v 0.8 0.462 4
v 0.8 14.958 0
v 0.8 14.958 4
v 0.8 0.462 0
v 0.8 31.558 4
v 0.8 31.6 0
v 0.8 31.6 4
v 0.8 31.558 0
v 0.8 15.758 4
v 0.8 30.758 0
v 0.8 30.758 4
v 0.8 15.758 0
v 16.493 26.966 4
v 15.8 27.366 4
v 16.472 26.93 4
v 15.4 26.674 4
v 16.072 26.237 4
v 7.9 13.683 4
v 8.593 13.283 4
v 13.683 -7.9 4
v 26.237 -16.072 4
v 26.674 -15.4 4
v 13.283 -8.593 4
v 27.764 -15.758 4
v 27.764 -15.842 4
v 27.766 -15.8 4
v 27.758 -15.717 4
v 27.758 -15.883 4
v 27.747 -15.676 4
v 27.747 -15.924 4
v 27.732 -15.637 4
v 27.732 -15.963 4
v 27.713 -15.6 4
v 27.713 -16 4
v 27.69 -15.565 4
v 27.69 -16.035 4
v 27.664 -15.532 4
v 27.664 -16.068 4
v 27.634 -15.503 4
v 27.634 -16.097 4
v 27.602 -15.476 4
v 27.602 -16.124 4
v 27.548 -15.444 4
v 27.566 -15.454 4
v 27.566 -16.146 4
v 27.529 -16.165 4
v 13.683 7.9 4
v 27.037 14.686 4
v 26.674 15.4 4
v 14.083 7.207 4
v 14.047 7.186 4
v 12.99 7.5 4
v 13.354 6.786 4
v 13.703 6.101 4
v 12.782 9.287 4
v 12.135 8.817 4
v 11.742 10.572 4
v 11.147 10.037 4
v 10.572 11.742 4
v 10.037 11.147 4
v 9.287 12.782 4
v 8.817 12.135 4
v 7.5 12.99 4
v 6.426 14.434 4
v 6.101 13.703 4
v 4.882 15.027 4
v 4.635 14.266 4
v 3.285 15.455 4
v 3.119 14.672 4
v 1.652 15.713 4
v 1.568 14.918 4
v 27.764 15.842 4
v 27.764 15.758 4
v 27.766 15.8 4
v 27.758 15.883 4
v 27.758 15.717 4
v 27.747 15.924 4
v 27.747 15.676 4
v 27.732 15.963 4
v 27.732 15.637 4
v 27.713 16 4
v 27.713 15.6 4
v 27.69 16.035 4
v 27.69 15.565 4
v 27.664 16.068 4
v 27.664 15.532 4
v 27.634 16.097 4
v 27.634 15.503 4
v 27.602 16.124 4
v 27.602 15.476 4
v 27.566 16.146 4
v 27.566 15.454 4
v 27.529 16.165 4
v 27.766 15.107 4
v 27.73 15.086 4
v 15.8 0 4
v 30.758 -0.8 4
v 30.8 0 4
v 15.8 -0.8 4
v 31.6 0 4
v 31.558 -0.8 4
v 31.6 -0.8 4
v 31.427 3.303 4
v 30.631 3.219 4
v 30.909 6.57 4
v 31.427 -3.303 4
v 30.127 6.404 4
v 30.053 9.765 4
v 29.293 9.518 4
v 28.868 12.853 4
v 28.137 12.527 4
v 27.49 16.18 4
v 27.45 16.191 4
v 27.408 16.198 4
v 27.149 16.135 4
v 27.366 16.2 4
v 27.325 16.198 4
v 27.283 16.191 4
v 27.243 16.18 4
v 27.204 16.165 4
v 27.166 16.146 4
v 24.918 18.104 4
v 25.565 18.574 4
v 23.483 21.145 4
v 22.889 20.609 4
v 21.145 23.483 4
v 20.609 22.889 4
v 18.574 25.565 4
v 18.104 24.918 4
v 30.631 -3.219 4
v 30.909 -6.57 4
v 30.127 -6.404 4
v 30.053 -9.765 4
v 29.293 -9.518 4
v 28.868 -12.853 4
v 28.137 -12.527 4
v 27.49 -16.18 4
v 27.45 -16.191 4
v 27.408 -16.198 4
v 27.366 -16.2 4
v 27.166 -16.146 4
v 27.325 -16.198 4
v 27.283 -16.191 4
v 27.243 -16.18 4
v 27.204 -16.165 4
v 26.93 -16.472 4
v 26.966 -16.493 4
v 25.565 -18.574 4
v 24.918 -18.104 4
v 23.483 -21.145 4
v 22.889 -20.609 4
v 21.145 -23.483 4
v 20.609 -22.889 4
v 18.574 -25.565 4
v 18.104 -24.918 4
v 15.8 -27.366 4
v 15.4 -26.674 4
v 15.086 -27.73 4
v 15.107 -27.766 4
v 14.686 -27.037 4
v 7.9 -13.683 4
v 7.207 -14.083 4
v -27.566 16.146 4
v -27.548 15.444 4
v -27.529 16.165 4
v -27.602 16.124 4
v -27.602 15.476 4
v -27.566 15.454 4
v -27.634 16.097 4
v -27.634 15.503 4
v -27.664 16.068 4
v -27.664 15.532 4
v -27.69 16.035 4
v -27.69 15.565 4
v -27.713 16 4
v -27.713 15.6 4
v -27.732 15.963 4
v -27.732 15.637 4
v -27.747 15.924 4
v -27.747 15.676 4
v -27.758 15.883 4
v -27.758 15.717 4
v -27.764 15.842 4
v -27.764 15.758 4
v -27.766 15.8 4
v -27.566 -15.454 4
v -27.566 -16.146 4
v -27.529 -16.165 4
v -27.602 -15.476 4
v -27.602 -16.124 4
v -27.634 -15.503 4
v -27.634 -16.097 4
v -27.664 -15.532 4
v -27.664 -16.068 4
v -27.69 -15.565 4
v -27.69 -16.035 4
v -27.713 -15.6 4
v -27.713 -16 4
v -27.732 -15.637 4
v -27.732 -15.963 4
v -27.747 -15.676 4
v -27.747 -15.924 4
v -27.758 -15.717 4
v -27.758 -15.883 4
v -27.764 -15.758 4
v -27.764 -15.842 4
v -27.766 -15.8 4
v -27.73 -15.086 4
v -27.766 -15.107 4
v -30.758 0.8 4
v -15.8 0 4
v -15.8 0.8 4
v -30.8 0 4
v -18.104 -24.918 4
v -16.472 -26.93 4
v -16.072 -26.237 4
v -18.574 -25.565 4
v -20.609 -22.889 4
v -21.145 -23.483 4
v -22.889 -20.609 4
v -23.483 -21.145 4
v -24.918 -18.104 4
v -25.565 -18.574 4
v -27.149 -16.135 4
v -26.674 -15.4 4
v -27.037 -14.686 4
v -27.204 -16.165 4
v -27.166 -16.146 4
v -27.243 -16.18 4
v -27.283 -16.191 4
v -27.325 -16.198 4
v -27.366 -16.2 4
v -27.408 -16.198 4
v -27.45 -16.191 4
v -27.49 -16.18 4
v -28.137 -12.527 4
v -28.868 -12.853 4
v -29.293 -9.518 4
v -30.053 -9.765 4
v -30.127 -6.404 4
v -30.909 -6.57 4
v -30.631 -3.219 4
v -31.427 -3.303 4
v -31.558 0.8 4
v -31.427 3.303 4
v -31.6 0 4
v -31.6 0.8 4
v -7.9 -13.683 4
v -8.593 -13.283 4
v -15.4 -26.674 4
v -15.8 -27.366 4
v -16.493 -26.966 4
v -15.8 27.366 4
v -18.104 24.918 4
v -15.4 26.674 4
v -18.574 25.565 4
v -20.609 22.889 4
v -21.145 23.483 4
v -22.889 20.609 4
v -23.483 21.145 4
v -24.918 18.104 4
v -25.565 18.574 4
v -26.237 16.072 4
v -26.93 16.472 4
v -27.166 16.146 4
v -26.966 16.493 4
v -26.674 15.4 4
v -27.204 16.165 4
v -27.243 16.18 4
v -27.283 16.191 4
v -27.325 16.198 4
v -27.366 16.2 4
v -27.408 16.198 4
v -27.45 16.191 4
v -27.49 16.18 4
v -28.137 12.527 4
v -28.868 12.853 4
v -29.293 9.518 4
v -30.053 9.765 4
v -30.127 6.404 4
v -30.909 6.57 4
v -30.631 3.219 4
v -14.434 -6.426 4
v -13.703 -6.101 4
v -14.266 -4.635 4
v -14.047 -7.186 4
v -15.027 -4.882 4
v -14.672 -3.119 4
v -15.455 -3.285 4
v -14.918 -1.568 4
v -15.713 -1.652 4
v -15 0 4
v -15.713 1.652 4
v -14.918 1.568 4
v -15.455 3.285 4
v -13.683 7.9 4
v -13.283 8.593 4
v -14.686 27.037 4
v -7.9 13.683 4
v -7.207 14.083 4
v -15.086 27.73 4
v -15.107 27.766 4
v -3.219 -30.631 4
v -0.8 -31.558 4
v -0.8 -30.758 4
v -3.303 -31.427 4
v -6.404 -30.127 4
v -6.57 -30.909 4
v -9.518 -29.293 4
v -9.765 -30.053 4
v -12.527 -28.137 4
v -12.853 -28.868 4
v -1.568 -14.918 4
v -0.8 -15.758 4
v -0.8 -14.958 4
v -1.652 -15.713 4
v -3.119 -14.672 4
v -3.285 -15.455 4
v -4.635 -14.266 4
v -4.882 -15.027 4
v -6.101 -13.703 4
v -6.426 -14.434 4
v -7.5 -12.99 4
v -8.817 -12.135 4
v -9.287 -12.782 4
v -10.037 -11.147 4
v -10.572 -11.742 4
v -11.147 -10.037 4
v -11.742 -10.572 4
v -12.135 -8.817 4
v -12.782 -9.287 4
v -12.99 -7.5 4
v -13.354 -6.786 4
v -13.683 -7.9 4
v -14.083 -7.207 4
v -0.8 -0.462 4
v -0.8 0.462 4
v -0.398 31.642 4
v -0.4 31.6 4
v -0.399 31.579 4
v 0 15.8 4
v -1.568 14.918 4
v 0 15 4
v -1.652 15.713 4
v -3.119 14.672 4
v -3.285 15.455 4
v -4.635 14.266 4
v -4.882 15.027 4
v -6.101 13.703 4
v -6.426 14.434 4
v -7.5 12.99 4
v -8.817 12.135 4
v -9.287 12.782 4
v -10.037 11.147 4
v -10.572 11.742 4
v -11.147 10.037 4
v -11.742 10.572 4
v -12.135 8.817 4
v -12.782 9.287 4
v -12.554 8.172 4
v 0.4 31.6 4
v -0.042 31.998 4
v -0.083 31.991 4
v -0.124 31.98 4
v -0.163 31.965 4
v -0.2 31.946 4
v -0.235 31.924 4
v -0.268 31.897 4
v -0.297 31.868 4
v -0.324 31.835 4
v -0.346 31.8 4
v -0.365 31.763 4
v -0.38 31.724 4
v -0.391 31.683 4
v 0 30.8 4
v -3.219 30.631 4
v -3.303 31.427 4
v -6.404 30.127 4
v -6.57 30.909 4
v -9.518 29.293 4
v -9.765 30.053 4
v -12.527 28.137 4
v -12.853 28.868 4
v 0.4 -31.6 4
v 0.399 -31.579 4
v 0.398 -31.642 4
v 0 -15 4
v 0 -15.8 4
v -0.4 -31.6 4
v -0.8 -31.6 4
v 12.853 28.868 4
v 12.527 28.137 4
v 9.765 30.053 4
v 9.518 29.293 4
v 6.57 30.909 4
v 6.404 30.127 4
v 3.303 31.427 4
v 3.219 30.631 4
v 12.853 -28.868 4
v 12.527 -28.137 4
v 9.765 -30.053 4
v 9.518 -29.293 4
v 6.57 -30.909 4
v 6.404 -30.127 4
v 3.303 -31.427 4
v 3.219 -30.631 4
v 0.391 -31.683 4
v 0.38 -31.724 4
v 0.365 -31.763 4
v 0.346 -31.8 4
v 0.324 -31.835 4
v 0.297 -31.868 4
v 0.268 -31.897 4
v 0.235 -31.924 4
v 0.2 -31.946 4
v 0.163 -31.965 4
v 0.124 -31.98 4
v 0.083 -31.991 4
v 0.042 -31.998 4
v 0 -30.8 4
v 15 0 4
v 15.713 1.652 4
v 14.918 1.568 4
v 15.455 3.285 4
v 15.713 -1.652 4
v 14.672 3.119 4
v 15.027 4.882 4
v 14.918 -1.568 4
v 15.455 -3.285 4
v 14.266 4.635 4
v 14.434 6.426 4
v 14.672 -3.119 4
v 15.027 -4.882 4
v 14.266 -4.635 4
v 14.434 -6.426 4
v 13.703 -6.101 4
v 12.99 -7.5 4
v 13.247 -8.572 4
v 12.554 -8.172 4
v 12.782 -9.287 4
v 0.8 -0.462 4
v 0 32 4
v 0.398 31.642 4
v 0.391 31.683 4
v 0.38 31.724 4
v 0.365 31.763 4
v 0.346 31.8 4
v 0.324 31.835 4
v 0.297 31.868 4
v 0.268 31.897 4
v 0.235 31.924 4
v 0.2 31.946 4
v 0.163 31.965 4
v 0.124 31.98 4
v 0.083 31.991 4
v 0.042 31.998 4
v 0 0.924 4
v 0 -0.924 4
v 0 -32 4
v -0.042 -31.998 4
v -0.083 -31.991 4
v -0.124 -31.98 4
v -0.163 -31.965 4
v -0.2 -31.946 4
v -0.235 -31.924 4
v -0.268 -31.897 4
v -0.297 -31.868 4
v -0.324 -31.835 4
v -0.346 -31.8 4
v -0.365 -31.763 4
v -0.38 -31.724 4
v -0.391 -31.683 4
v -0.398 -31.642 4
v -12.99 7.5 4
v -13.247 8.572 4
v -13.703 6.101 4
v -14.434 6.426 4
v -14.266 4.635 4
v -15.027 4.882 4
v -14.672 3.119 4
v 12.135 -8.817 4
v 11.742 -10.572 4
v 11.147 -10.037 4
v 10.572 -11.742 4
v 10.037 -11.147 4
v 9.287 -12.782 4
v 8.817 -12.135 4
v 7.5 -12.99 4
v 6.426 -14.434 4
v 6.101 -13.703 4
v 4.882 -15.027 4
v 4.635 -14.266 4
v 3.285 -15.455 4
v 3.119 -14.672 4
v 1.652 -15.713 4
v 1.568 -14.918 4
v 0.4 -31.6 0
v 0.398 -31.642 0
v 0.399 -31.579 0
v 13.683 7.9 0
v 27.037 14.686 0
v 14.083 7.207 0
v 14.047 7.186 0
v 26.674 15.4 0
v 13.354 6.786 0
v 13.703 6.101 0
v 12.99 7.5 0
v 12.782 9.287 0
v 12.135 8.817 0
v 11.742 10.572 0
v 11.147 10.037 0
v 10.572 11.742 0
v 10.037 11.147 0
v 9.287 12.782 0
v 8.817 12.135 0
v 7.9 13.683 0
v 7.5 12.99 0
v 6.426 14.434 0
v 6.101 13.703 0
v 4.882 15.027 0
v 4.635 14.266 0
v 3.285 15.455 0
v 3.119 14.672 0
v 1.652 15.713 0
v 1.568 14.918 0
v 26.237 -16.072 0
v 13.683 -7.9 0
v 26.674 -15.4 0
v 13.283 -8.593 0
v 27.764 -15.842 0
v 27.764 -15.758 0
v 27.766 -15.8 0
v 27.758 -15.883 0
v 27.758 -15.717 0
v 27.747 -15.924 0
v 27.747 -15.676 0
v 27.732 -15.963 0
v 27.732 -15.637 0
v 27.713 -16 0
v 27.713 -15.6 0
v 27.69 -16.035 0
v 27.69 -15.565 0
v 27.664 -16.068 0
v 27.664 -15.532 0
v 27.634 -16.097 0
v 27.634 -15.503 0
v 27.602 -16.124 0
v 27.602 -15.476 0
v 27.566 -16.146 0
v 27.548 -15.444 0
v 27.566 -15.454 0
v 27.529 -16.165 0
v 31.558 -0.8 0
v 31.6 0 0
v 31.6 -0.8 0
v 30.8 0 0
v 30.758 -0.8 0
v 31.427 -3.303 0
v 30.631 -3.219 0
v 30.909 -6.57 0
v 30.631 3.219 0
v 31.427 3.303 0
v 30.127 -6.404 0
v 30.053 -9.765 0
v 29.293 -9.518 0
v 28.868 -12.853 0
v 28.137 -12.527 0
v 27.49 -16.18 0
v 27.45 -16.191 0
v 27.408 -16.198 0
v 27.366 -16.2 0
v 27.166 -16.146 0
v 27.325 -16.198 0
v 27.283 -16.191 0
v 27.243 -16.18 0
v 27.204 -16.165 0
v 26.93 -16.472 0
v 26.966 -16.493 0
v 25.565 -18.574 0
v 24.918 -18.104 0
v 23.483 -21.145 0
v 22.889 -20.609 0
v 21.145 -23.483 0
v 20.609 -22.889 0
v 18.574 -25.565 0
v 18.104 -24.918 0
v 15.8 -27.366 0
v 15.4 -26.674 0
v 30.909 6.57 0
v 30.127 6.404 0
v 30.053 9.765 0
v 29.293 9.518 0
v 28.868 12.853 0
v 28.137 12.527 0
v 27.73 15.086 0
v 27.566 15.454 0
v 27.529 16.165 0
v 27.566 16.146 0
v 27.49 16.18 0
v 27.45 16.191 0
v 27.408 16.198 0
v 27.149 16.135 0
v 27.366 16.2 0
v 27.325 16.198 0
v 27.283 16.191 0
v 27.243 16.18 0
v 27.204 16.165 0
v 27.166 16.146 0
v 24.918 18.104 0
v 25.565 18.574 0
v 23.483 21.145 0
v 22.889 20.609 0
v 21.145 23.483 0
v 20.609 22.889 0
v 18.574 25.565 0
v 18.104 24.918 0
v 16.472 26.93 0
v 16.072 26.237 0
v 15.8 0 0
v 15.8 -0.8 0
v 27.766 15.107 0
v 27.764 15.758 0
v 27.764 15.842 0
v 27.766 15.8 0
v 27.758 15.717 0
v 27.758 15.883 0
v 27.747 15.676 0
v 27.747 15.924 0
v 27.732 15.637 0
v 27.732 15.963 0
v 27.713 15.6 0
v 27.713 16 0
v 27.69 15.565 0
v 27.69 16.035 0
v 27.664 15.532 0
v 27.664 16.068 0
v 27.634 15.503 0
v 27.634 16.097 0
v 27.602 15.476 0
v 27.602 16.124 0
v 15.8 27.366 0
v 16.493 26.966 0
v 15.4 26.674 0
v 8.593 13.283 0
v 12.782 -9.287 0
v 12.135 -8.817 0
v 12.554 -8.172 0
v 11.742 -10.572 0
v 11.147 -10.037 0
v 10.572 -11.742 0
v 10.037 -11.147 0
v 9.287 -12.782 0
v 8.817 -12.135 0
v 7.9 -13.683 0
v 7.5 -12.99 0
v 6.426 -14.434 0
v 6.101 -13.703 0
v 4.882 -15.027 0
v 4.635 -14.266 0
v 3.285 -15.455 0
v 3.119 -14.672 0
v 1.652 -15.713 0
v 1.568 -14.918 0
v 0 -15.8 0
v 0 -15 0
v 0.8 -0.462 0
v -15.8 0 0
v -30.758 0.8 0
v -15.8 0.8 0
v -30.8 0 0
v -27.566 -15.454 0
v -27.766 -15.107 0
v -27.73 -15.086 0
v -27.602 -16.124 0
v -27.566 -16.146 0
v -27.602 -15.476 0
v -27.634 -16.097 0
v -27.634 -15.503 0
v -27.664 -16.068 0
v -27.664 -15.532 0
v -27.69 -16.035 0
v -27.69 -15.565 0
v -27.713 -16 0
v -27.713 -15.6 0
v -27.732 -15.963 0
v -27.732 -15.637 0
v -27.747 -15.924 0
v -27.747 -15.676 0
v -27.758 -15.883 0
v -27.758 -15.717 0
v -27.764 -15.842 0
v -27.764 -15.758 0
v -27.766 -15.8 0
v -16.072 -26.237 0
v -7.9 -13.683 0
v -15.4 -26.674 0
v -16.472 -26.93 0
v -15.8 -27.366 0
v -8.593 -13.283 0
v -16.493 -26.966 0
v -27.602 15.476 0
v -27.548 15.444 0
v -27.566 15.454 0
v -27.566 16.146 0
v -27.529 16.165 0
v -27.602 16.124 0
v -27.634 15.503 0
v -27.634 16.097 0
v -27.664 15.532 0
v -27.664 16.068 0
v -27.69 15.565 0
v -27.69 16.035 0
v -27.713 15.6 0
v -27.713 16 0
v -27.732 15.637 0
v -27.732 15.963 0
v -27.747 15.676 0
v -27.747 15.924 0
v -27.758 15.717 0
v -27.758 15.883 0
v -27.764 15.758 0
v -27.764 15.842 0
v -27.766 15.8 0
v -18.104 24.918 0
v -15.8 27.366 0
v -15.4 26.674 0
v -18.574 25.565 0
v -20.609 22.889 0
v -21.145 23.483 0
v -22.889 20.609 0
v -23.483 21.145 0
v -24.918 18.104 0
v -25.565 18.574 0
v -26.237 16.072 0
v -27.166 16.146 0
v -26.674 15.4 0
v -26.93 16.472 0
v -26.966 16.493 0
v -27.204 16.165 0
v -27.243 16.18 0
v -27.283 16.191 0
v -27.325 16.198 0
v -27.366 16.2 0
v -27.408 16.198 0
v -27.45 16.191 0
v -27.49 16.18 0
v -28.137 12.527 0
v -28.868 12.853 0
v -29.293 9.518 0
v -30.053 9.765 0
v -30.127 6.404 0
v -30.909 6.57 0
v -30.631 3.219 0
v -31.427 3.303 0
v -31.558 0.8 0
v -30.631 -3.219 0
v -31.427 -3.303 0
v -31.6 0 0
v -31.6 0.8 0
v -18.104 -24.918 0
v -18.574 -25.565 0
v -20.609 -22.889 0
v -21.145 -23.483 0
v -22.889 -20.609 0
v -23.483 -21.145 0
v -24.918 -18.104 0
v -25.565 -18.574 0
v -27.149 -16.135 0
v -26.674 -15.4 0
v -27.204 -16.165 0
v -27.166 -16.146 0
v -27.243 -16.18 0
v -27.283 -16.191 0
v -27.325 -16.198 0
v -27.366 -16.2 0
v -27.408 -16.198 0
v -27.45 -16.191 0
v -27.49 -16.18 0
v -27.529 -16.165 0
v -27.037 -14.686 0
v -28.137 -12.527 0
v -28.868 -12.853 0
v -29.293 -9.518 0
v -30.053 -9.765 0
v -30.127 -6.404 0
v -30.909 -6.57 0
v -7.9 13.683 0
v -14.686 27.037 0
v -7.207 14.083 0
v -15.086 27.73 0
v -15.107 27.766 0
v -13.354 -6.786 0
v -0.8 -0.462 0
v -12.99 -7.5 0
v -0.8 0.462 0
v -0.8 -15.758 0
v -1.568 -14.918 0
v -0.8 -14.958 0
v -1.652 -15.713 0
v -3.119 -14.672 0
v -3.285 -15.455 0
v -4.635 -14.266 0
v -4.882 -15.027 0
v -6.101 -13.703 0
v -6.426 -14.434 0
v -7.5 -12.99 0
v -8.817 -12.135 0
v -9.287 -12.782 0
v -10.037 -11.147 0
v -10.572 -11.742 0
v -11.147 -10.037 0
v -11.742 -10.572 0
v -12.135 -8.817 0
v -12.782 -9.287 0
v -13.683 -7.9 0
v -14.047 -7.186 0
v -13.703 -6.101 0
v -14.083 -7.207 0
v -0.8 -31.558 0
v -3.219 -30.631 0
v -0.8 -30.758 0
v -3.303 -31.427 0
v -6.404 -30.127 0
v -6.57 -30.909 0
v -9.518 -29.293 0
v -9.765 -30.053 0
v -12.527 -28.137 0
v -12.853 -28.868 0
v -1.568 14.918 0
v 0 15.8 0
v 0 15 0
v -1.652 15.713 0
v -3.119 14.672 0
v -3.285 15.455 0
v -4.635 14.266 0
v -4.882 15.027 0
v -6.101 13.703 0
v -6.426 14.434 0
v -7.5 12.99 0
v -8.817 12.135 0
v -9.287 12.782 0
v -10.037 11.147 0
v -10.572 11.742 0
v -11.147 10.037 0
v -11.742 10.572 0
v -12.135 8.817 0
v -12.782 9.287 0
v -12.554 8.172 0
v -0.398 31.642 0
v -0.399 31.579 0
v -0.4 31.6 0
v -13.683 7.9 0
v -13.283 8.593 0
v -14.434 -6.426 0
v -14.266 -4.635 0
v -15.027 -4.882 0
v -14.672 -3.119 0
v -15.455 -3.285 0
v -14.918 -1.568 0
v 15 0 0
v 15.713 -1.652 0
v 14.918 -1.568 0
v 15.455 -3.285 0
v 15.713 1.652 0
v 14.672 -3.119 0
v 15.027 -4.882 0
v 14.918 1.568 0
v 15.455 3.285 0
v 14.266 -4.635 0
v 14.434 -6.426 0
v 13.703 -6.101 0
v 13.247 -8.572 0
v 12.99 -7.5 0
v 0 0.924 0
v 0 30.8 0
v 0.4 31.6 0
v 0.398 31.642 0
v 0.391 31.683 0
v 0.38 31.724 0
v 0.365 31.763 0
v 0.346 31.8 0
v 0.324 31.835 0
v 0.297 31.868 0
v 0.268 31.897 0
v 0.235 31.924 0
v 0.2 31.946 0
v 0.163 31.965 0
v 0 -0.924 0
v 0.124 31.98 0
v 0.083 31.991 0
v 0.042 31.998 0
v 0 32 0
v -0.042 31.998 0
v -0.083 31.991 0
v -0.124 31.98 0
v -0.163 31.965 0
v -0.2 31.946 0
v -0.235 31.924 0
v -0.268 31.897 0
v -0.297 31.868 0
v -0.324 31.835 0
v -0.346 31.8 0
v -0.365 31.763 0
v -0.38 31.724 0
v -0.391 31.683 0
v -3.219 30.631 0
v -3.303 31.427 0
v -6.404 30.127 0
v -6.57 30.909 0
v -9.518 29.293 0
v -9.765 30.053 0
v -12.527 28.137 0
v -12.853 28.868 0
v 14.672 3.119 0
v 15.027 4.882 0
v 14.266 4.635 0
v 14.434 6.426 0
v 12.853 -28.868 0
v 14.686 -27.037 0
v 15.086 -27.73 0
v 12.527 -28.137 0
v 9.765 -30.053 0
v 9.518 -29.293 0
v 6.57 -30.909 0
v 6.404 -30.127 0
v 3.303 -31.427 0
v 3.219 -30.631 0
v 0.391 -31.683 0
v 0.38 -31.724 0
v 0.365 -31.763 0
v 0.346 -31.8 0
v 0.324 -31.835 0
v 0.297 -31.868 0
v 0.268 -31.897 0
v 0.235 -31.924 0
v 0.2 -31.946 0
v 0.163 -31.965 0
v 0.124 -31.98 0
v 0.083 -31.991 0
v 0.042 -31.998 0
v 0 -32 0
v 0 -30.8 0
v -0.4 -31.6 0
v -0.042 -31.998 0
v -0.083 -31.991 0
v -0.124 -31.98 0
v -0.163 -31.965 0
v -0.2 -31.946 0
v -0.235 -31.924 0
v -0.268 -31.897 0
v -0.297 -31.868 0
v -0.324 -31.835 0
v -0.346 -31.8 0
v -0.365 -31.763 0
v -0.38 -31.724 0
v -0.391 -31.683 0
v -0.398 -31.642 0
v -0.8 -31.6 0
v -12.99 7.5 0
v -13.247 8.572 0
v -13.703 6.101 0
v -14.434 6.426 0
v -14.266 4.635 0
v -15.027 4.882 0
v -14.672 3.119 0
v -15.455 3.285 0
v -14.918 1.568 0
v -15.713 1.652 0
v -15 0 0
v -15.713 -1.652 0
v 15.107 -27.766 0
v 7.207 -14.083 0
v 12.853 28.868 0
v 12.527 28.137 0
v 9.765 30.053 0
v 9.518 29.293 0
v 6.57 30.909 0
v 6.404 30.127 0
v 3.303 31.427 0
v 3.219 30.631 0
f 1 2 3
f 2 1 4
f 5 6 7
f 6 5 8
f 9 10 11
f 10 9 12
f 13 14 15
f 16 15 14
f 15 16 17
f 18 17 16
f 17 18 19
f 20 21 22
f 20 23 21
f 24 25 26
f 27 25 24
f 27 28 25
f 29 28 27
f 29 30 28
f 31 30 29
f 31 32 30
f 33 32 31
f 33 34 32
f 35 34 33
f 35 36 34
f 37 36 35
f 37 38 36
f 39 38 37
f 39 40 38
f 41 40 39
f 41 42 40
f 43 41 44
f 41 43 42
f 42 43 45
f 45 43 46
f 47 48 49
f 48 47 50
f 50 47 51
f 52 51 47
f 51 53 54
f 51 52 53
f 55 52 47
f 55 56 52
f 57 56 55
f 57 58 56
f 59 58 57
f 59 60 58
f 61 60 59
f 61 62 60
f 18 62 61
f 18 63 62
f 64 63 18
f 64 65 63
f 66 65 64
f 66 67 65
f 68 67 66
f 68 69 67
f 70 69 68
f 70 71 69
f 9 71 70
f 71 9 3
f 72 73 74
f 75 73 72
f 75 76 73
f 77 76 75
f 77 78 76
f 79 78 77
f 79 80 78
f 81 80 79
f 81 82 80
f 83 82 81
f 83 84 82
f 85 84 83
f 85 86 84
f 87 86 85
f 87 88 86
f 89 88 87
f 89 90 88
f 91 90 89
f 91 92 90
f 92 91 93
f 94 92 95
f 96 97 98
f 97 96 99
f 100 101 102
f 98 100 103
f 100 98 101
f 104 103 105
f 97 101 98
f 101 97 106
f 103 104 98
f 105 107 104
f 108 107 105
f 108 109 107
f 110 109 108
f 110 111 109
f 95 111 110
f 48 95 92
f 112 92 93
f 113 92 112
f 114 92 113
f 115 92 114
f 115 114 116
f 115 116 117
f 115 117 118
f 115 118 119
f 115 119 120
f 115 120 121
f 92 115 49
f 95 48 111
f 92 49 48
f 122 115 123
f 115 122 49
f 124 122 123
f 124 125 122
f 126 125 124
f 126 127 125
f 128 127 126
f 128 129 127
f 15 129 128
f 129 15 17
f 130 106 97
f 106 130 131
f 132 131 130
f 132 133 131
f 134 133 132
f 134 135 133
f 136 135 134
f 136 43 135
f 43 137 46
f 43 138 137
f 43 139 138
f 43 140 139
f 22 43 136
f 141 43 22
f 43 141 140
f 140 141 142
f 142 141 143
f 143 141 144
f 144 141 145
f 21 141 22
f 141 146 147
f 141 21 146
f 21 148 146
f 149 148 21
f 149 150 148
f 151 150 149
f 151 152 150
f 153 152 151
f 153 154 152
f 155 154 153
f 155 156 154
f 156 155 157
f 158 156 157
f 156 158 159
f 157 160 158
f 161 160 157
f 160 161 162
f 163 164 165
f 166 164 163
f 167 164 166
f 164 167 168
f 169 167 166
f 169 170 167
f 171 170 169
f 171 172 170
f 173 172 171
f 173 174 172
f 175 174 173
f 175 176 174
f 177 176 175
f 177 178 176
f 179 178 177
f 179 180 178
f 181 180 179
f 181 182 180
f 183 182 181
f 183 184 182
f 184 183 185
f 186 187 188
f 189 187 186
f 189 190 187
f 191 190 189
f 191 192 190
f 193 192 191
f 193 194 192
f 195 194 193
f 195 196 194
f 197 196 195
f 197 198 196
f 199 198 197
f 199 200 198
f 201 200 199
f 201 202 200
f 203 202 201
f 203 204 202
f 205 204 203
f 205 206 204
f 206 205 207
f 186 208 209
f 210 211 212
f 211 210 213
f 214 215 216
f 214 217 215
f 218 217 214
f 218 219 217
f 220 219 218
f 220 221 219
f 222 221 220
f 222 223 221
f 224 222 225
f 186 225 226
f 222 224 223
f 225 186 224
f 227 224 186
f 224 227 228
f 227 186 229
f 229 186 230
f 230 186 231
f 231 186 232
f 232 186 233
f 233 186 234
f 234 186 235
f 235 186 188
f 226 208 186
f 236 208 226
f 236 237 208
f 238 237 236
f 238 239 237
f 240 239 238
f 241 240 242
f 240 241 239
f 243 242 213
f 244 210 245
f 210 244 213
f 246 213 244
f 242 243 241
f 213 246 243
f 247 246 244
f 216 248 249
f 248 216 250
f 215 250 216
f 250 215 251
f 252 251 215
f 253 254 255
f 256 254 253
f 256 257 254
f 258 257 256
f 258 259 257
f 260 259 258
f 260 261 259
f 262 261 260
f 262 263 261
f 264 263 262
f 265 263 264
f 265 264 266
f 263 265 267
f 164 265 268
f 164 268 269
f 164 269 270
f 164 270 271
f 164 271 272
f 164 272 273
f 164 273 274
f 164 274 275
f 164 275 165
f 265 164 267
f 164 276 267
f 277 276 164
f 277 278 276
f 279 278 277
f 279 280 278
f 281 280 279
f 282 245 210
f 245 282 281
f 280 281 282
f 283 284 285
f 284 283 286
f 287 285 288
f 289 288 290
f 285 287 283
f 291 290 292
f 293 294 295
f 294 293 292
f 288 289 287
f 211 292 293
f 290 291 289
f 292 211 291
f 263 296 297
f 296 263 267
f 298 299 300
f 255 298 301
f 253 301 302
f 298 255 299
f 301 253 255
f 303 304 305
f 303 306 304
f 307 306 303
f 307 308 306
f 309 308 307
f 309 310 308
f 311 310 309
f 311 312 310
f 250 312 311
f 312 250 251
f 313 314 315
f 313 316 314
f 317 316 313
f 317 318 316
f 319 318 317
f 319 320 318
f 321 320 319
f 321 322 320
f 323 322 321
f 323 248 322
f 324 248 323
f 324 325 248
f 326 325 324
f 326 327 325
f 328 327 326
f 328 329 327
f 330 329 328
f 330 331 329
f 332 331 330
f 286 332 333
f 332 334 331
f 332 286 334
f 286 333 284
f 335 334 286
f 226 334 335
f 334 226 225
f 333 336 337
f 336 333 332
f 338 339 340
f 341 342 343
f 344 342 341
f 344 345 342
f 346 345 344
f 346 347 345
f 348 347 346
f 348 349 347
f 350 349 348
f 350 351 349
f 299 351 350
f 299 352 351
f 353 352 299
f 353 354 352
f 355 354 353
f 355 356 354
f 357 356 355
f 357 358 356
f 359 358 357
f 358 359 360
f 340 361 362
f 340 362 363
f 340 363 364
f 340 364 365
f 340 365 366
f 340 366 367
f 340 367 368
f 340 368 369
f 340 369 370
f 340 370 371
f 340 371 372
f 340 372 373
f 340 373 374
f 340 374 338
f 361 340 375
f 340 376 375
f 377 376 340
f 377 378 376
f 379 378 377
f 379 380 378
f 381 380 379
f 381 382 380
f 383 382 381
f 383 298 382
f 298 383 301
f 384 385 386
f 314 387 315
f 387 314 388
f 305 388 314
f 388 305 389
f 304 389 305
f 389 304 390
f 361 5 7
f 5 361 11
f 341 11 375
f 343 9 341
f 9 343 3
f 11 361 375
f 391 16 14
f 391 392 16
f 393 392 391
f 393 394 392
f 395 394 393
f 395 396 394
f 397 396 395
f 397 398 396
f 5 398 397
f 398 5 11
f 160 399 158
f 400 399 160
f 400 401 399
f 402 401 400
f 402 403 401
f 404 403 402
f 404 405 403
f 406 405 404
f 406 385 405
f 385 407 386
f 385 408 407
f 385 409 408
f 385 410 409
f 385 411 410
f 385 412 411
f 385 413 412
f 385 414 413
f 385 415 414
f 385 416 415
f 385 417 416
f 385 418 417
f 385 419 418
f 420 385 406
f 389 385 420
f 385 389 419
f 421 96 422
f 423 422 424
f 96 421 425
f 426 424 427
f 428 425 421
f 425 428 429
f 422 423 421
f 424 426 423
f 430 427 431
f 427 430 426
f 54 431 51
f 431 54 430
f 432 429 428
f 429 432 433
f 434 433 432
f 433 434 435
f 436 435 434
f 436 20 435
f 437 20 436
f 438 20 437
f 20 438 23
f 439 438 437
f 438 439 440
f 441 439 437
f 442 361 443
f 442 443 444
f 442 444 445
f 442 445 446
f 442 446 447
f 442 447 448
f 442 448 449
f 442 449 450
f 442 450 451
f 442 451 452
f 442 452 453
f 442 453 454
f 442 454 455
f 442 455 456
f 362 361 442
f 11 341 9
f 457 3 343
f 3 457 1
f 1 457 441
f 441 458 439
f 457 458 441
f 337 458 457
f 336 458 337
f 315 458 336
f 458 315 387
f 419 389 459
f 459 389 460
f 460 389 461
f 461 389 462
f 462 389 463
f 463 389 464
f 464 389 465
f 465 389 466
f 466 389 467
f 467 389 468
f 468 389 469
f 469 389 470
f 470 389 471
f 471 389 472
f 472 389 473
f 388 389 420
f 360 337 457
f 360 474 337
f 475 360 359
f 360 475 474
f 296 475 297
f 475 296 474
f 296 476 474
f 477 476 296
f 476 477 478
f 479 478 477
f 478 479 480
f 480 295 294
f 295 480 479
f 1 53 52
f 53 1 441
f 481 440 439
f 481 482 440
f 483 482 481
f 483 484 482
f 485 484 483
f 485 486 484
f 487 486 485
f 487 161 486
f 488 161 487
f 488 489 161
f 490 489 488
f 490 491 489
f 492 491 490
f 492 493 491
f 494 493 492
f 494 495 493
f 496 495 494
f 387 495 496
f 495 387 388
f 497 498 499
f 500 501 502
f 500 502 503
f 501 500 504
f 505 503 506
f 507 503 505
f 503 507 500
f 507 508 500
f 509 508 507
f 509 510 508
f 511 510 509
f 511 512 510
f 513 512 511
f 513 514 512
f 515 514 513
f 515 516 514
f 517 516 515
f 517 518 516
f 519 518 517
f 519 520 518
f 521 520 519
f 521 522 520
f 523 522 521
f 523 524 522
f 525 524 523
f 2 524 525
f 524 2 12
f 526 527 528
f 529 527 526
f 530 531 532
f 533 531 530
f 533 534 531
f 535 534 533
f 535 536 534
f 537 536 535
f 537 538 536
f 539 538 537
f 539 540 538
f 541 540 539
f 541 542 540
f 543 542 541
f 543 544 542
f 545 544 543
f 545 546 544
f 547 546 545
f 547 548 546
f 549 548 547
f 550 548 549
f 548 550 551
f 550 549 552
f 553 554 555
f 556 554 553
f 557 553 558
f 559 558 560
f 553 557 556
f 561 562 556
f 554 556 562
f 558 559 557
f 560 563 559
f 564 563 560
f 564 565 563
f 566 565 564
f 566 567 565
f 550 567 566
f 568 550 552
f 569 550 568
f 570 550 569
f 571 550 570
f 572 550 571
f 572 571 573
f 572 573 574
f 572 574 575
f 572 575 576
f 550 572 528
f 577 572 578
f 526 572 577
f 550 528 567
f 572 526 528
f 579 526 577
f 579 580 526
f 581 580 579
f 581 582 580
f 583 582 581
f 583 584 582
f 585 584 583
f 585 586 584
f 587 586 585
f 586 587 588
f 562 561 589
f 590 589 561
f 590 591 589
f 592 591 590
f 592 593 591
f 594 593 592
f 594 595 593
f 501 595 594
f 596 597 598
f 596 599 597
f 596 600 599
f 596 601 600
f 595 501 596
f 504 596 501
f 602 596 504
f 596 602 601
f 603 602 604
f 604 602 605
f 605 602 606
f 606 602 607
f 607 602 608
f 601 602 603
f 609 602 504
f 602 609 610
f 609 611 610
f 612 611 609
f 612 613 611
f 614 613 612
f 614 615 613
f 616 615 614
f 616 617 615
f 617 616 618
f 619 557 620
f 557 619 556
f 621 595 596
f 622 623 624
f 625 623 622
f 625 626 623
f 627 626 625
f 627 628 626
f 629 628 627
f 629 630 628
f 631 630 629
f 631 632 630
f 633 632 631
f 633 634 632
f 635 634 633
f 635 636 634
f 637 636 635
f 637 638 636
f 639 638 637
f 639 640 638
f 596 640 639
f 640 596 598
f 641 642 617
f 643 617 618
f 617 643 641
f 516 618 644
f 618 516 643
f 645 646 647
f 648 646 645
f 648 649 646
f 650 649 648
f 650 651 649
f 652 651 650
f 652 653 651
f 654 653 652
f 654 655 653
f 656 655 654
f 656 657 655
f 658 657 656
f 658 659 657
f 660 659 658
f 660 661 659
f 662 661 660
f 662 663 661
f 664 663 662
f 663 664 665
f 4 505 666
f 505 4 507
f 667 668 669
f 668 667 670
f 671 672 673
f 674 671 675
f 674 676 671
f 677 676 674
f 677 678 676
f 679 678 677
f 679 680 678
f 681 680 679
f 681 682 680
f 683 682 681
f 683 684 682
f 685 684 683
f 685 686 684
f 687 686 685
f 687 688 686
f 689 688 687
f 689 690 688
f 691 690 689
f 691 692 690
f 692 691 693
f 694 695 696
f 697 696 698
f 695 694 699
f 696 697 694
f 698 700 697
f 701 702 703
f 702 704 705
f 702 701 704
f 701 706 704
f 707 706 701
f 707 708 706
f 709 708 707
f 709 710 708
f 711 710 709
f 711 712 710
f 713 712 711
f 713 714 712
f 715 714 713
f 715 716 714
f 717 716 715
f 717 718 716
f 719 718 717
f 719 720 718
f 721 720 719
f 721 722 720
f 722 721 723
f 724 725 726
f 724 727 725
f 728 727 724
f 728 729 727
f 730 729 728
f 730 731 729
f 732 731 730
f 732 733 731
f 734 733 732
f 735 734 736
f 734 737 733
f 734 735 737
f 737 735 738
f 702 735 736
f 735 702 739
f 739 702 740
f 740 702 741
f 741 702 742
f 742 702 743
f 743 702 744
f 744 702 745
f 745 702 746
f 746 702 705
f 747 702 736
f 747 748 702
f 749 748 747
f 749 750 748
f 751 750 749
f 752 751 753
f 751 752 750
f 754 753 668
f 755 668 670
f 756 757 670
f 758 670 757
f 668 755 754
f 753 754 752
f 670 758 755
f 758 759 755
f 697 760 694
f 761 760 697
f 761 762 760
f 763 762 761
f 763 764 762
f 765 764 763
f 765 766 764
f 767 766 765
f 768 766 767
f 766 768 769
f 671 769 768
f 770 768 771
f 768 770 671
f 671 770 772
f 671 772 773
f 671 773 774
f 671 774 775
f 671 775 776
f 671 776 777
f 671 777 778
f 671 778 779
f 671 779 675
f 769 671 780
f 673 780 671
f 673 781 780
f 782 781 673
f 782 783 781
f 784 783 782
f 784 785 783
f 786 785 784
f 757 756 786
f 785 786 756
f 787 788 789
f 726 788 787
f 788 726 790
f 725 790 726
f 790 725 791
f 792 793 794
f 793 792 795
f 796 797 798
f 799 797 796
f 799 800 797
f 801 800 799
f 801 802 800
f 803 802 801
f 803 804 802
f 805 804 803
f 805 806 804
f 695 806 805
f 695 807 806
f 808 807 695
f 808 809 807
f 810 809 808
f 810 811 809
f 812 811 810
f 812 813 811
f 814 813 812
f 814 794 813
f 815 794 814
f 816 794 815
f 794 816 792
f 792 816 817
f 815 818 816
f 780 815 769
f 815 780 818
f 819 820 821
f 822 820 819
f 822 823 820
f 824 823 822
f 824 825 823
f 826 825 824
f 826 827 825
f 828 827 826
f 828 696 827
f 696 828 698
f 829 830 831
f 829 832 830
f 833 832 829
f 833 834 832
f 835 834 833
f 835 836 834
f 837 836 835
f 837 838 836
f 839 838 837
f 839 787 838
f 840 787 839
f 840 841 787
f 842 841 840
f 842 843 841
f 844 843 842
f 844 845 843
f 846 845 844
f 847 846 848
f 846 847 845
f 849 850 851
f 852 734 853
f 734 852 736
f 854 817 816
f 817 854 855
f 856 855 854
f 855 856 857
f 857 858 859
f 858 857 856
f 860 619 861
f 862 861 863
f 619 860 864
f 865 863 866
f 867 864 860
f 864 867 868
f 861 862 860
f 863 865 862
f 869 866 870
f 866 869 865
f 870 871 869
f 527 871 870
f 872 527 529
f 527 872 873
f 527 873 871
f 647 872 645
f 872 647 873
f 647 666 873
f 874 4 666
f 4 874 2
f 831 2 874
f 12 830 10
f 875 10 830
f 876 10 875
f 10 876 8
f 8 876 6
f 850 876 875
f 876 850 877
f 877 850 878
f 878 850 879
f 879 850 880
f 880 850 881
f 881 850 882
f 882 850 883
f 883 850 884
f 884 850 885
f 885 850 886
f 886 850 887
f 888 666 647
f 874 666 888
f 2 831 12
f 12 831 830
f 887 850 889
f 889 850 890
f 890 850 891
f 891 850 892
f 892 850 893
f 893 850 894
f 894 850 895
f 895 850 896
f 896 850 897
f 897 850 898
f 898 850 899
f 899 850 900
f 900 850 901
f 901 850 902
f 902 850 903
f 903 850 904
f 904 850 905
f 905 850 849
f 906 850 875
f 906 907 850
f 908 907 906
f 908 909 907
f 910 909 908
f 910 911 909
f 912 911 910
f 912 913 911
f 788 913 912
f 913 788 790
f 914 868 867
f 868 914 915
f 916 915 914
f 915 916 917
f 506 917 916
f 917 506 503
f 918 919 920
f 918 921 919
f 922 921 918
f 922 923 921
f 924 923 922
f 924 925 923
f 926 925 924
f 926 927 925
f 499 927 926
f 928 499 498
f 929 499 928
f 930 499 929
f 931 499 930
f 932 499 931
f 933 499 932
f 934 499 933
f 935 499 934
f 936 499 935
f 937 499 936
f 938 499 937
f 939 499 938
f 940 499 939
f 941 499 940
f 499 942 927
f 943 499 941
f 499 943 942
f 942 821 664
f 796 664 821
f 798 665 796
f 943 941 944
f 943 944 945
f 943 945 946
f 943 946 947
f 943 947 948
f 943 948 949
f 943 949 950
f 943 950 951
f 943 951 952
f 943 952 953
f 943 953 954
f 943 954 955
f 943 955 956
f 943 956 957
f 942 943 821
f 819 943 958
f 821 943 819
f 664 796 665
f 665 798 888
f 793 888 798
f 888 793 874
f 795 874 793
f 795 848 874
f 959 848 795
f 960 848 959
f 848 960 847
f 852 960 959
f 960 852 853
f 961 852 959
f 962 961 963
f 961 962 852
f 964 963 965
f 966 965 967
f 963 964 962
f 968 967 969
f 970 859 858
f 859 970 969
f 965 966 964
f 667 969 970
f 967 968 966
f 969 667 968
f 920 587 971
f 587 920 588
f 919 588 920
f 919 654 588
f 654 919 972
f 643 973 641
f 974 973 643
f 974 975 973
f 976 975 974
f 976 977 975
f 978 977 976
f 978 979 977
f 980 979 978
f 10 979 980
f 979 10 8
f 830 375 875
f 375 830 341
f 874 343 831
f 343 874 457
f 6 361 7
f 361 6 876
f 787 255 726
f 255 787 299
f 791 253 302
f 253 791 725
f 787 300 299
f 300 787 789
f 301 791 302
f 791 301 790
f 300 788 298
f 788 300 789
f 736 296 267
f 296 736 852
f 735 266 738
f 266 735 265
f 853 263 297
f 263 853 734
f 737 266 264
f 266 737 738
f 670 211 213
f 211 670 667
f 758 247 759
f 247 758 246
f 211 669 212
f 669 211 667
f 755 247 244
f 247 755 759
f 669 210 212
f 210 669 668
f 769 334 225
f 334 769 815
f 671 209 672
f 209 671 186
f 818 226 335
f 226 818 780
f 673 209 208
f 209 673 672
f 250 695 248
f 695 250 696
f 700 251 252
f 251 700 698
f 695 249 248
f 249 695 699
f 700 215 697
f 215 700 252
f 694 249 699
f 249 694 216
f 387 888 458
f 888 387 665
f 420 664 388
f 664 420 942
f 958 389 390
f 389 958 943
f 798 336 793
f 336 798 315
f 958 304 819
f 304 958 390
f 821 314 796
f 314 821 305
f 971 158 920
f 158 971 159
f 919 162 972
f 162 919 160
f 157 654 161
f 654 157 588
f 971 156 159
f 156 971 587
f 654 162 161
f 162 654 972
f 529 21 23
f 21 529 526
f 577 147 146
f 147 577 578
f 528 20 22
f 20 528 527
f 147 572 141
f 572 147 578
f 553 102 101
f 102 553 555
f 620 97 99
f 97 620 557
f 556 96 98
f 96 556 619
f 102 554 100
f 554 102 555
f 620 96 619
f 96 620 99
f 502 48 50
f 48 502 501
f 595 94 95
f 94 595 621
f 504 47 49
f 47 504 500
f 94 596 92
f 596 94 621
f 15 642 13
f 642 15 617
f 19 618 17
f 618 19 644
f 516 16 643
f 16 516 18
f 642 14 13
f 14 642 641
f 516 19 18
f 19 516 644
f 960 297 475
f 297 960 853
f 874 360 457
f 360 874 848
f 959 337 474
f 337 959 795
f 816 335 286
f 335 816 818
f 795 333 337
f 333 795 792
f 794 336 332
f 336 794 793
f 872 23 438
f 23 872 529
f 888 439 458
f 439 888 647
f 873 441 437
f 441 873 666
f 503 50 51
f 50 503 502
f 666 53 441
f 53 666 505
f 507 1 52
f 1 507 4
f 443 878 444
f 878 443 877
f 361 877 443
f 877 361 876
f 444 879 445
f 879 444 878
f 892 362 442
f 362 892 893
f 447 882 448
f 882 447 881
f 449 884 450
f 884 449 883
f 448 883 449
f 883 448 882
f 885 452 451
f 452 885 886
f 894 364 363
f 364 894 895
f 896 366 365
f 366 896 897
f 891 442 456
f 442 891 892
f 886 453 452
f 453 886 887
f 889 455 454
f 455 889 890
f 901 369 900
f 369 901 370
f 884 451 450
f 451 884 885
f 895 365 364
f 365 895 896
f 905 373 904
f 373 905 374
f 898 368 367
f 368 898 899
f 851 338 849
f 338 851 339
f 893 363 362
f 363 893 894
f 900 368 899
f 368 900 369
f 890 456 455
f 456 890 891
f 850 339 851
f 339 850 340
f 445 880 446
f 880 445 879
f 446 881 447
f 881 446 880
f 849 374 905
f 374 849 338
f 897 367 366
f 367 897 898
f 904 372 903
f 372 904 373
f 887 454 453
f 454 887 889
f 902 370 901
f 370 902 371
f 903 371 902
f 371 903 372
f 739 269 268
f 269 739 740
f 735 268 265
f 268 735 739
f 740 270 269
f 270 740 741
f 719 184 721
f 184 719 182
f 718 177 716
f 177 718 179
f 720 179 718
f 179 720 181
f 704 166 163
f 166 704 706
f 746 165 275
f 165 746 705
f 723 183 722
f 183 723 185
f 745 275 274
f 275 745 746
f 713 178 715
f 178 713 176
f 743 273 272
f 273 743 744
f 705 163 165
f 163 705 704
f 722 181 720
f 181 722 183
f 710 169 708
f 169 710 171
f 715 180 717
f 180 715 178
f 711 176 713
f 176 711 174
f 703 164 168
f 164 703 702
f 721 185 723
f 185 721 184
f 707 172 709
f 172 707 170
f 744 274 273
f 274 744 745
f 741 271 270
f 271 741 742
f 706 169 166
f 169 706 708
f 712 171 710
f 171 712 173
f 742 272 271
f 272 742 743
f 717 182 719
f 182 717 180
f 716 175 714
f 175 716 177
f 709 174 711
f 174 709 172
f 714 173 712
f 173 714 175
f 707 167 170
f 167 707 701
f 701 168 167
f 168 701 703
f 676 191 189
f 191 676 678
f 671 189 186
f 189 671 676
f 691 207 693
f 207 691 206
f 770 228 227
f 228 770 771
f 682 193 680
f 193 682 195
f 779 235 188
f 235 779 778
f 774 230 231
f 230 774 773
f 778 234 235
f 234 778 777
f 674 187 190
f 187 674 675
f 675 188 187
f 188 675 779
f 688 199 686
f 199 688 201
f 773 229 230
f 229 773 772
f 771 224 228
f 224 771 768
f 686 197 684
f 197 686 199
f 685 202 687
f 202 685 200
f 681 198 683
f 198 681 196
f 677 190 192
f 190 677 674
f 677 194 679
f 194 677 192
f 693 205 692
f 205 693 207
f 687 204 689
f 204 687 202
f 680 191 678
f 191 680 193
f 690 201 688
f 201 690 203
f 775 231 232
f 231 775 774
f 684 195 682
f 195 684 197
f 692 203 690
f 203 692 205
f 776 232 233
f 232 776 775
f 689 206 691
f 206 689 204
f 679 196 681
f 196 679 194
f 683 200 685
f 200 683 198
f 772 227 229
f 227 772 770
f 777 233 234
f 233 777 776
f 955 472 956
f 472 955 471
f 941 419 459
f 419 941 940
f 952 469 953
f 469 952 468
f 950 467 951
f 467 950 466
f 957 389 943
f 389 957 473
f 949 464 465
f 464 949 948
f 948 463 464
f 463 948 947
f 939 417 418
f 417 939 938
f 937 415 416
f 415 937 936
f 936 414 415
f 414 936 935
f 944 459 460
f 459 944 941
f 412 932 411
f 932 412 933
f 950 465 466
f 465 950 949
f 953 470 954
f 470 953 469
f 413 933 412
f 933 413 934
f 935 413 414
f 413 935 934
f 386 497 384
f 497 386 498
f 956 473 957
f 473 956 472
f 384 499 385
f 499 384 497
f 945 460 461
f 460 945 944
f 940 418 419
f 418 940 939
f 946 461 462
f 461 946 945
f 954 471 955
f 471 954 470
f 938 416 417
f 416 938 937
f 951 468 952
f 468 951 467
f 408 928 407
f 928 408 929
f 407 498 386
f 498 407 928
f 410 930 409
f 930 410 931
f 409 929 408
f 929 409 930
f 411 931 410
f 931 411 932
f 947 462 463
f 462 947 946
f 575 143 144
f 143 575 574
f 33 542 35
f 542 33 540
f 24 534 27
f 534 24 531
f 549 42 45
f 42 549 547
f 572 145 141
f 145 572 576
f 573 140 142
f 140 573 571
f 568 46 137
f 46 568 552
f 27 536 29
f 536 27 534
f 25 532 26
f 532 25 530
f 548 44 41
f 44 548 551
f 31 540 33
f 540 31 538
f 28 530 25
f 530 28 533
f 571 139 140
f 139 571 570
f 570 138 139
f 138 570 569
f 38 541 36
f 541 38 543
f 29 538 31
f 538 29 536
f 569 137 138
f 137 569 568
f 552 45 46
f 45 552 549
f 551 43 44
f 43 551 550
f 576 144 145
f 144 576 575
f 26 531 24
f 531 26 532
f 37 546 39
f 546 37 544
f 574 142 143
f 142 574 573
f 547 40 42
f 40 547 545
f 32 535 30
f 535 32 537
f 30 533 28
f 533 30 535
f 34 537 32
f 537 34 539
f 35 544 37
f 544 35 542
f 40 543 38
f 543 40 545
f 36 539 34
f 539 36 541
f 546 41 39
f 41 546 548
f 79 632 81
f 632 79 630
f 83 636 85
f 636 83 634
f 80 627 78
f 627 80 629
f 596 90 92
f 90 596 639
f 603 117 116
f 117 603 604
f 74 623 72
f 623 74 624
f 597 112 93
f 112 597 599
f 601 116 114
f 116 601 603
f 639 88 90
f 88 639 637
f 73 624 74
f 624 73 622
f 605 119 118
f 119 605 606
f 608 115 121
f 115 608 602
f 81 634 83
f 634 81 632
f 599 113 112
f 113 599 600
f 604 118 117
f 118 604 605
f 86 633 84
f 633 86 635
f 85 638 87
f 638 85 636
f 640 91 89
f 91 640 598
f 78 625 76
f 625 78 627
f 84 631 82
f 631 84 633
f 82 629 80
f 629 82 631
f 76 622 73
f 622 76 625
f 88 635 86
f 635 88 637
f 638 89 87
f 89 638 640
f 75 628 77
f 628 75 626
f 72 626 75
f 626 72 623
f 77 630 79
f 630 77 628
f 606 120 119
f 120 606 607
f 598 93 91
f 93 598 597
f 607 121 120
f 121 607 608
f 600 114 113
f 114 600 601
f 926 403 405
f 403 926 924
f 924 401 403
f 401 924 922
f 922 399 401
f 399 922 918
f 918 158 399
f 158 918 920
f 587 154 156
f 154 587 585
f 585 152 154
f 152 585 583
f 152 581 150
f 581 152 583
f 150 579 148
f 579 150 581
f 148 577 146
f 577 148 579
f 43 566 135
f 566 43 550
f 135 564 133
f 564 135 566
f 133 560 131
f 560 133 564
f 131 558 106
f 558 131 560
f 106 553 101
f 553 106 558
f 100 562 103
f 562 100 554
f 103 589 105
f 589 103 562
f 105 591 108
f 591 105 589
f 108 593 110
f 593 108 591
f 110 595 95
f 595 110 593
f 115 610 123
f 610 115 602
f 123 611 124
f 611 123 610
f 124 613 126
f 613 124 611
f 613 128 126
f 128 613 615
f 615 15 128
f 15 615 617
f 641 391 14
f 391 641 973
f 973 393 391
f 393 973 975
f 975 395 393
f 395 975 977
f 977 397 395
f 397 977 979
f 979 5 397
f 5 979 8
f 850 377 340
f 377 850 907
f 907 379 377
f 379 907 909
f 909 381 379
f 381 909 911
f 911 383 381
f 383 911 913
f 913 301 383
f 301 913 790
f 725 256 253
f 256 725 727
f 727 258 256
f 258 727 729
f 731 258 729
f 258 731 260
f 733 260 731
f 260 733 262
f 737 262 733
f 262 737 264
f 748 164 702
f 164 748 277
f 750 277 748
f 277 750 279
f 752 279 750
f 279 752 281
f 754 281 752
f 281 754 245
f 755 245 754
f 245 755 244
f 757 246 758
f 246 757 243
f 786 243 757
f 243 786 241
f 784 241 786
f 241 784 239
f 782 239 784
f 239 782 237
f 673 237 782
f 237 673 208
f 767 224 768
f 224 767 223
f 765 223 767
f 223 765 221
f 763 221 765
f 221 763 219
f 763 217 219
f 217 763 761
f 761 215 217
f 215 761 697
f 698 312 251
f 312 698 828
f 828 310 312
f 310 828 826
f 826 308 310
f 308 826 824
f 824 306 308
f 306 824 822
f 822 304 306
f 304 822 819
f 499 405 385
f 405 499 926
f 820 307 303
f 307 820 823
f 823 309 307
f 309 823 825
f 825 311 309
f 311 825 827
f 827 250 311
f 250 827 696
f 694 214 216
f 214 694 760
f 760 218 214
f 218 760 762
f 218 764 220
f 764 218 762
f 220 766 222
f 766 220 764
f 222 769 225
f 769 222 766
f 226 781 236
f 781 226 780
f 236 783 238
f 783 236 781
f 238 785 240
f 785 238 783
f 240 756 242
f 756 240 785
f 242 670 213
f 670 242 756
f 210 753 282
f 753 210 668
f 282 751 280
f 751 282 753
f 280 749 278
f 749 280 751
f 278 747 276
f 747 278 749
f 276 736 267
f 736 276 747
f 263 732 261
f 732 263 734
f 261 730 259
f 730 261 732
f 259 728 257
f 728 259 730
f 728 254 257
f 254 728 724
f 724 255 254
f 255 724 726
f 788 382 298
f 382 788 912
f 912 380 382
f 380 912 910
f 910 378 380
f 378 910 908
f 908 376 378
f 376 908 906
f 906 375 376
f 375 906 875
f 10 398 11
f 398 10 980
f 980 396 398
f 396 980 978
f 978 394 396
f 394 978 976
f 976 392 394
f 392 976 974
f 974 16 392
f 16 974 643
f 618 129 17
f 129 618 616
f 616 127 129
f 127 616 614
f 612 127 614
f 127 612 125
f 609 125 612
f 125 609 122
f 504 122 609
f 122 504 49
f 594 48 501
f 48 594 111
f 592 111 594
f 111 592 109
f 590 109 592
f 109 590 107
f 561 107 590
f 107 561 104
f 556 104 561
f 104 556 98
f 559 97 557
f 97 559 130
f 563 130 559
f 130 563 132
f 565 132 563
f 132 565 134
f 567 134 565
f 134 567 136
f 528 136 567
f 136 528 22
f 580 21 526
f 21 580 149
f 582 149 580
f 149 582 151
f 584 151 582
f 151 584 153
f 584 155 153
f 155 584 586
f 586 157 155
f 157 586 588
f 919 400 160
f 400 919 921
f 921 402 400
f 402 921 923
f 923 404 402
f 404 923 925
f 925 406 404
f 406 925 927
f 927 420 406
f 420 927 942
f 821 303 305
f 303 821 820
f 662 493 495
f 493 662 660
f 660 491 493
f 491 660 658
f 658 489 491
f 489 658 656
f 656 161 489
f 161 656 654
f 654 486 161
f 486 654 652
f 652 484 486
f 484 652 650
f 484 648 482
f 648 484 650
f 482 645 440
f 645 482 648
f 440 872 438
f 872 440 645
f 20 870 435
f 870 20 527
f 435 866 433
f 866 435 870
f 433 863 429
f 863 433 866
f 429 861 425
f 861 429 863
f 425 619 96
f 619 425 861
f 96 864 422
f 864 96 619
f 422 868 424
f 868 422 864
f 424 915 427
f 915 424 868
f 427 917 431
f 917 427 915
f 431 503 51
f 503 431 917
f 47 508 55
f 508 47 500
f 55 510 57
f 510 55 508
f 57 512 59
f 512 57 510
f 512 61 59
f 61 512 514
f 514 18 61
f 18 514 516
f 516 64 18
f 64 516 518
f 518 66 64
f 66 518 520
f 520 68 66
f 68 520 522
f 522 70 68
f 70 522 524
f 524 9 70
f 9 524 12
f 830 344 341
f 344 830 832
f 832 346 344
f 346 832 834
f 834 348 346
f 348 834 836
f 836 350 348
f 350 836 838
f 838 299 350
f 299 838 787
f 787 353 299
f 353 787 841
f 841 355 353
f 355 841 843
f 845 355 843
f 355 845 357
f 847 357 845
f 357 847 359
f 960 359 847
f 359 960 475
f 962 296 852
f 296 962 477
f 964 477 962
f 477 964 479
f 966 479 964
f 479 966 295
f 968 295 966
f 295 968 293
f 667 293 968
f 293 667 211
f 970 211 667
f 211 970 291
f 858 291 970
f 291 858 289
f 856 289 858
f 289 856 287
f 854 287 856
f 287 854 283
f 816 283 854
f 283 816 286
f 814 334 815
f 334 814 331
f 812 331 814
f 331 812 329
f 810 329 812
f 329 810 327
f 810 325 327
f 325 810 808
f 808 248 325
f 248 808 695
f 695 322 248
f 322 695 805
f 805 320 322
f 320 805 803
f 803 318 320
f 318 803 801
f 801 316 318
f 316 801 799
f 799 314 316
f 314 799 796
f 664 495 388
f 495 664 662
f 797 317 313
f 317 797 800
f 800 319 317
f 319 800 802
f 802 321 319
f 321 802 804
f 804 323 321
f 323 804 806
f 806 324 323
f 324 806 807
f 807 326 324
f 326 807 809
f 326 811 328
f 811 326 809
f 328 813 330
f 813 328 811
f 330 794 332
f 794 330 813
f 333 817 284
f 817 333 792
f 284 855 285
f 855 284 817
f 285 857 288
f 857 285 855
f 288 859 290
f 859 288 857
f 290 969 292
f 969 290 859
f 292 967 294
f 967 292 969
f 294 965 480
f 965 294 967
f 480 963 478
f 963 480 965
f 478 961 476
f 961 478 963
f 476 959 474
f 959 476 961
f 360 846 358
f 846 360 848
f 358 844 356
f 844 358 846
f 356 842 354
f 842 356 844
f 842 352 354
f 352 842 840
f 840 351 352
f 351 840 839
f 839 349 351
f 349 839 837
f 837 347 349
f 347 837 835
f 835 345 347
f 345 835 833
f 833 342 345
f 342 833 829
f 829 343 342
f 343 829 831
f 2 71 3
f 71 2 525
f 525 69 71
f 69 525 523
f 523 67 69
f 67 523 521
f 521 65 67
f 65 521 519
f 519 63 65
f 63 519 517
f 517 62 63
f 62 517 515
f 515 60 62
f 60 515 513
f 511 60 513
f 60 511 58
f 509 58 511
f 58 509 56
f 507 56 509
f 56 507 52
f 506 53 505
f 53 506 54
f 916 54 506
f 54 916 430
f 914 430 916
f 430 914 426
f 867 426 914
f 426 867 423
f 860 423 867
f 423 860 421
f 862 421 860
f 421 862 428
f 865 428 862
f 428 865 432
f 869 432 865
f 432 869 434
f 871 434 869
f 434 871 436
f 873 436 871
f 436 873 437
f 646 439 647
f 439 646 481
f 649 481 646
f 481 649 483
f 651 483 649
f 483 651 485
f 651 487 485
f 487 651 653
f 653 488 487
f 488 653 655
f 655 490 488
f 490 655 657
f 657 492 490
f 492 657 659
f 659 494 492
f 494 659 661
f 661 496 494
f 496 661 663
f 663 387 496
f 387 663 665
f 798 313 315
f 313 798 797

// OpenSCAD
r=64/2;
h=4;
wall_w=0.8;
num_spokes=12;
$fn=60;

r_eff=r-wall_w/2;

union() {
    circ(r_eff, wall_w);
    circ(r_eff/2, wall_w);

    for(i=[0:360/num_spokes:360]) {
      rotate([0,0,i])
        translate([0,r_eff/2,0])
            cube([wall_w, r_eff/2, h],center=false);
    }

    for(i=[0:360/num_spokes*2:360]) {
      rotate([0,0,i])
            cube([wall_w, r_eff/2, h],center=false);
    }
    
    for(i=[0:360/num_spokes*2:360]) {
      rotate([0,0,i])
        translate([0,r_eff,0])cylinder(h=h,r=wall_w/2);
    }

}

module circ(r, w) {
    linear_extrude(h)difference(){
        circle(r);
        circle(r-wall_w);
        
    }
}
